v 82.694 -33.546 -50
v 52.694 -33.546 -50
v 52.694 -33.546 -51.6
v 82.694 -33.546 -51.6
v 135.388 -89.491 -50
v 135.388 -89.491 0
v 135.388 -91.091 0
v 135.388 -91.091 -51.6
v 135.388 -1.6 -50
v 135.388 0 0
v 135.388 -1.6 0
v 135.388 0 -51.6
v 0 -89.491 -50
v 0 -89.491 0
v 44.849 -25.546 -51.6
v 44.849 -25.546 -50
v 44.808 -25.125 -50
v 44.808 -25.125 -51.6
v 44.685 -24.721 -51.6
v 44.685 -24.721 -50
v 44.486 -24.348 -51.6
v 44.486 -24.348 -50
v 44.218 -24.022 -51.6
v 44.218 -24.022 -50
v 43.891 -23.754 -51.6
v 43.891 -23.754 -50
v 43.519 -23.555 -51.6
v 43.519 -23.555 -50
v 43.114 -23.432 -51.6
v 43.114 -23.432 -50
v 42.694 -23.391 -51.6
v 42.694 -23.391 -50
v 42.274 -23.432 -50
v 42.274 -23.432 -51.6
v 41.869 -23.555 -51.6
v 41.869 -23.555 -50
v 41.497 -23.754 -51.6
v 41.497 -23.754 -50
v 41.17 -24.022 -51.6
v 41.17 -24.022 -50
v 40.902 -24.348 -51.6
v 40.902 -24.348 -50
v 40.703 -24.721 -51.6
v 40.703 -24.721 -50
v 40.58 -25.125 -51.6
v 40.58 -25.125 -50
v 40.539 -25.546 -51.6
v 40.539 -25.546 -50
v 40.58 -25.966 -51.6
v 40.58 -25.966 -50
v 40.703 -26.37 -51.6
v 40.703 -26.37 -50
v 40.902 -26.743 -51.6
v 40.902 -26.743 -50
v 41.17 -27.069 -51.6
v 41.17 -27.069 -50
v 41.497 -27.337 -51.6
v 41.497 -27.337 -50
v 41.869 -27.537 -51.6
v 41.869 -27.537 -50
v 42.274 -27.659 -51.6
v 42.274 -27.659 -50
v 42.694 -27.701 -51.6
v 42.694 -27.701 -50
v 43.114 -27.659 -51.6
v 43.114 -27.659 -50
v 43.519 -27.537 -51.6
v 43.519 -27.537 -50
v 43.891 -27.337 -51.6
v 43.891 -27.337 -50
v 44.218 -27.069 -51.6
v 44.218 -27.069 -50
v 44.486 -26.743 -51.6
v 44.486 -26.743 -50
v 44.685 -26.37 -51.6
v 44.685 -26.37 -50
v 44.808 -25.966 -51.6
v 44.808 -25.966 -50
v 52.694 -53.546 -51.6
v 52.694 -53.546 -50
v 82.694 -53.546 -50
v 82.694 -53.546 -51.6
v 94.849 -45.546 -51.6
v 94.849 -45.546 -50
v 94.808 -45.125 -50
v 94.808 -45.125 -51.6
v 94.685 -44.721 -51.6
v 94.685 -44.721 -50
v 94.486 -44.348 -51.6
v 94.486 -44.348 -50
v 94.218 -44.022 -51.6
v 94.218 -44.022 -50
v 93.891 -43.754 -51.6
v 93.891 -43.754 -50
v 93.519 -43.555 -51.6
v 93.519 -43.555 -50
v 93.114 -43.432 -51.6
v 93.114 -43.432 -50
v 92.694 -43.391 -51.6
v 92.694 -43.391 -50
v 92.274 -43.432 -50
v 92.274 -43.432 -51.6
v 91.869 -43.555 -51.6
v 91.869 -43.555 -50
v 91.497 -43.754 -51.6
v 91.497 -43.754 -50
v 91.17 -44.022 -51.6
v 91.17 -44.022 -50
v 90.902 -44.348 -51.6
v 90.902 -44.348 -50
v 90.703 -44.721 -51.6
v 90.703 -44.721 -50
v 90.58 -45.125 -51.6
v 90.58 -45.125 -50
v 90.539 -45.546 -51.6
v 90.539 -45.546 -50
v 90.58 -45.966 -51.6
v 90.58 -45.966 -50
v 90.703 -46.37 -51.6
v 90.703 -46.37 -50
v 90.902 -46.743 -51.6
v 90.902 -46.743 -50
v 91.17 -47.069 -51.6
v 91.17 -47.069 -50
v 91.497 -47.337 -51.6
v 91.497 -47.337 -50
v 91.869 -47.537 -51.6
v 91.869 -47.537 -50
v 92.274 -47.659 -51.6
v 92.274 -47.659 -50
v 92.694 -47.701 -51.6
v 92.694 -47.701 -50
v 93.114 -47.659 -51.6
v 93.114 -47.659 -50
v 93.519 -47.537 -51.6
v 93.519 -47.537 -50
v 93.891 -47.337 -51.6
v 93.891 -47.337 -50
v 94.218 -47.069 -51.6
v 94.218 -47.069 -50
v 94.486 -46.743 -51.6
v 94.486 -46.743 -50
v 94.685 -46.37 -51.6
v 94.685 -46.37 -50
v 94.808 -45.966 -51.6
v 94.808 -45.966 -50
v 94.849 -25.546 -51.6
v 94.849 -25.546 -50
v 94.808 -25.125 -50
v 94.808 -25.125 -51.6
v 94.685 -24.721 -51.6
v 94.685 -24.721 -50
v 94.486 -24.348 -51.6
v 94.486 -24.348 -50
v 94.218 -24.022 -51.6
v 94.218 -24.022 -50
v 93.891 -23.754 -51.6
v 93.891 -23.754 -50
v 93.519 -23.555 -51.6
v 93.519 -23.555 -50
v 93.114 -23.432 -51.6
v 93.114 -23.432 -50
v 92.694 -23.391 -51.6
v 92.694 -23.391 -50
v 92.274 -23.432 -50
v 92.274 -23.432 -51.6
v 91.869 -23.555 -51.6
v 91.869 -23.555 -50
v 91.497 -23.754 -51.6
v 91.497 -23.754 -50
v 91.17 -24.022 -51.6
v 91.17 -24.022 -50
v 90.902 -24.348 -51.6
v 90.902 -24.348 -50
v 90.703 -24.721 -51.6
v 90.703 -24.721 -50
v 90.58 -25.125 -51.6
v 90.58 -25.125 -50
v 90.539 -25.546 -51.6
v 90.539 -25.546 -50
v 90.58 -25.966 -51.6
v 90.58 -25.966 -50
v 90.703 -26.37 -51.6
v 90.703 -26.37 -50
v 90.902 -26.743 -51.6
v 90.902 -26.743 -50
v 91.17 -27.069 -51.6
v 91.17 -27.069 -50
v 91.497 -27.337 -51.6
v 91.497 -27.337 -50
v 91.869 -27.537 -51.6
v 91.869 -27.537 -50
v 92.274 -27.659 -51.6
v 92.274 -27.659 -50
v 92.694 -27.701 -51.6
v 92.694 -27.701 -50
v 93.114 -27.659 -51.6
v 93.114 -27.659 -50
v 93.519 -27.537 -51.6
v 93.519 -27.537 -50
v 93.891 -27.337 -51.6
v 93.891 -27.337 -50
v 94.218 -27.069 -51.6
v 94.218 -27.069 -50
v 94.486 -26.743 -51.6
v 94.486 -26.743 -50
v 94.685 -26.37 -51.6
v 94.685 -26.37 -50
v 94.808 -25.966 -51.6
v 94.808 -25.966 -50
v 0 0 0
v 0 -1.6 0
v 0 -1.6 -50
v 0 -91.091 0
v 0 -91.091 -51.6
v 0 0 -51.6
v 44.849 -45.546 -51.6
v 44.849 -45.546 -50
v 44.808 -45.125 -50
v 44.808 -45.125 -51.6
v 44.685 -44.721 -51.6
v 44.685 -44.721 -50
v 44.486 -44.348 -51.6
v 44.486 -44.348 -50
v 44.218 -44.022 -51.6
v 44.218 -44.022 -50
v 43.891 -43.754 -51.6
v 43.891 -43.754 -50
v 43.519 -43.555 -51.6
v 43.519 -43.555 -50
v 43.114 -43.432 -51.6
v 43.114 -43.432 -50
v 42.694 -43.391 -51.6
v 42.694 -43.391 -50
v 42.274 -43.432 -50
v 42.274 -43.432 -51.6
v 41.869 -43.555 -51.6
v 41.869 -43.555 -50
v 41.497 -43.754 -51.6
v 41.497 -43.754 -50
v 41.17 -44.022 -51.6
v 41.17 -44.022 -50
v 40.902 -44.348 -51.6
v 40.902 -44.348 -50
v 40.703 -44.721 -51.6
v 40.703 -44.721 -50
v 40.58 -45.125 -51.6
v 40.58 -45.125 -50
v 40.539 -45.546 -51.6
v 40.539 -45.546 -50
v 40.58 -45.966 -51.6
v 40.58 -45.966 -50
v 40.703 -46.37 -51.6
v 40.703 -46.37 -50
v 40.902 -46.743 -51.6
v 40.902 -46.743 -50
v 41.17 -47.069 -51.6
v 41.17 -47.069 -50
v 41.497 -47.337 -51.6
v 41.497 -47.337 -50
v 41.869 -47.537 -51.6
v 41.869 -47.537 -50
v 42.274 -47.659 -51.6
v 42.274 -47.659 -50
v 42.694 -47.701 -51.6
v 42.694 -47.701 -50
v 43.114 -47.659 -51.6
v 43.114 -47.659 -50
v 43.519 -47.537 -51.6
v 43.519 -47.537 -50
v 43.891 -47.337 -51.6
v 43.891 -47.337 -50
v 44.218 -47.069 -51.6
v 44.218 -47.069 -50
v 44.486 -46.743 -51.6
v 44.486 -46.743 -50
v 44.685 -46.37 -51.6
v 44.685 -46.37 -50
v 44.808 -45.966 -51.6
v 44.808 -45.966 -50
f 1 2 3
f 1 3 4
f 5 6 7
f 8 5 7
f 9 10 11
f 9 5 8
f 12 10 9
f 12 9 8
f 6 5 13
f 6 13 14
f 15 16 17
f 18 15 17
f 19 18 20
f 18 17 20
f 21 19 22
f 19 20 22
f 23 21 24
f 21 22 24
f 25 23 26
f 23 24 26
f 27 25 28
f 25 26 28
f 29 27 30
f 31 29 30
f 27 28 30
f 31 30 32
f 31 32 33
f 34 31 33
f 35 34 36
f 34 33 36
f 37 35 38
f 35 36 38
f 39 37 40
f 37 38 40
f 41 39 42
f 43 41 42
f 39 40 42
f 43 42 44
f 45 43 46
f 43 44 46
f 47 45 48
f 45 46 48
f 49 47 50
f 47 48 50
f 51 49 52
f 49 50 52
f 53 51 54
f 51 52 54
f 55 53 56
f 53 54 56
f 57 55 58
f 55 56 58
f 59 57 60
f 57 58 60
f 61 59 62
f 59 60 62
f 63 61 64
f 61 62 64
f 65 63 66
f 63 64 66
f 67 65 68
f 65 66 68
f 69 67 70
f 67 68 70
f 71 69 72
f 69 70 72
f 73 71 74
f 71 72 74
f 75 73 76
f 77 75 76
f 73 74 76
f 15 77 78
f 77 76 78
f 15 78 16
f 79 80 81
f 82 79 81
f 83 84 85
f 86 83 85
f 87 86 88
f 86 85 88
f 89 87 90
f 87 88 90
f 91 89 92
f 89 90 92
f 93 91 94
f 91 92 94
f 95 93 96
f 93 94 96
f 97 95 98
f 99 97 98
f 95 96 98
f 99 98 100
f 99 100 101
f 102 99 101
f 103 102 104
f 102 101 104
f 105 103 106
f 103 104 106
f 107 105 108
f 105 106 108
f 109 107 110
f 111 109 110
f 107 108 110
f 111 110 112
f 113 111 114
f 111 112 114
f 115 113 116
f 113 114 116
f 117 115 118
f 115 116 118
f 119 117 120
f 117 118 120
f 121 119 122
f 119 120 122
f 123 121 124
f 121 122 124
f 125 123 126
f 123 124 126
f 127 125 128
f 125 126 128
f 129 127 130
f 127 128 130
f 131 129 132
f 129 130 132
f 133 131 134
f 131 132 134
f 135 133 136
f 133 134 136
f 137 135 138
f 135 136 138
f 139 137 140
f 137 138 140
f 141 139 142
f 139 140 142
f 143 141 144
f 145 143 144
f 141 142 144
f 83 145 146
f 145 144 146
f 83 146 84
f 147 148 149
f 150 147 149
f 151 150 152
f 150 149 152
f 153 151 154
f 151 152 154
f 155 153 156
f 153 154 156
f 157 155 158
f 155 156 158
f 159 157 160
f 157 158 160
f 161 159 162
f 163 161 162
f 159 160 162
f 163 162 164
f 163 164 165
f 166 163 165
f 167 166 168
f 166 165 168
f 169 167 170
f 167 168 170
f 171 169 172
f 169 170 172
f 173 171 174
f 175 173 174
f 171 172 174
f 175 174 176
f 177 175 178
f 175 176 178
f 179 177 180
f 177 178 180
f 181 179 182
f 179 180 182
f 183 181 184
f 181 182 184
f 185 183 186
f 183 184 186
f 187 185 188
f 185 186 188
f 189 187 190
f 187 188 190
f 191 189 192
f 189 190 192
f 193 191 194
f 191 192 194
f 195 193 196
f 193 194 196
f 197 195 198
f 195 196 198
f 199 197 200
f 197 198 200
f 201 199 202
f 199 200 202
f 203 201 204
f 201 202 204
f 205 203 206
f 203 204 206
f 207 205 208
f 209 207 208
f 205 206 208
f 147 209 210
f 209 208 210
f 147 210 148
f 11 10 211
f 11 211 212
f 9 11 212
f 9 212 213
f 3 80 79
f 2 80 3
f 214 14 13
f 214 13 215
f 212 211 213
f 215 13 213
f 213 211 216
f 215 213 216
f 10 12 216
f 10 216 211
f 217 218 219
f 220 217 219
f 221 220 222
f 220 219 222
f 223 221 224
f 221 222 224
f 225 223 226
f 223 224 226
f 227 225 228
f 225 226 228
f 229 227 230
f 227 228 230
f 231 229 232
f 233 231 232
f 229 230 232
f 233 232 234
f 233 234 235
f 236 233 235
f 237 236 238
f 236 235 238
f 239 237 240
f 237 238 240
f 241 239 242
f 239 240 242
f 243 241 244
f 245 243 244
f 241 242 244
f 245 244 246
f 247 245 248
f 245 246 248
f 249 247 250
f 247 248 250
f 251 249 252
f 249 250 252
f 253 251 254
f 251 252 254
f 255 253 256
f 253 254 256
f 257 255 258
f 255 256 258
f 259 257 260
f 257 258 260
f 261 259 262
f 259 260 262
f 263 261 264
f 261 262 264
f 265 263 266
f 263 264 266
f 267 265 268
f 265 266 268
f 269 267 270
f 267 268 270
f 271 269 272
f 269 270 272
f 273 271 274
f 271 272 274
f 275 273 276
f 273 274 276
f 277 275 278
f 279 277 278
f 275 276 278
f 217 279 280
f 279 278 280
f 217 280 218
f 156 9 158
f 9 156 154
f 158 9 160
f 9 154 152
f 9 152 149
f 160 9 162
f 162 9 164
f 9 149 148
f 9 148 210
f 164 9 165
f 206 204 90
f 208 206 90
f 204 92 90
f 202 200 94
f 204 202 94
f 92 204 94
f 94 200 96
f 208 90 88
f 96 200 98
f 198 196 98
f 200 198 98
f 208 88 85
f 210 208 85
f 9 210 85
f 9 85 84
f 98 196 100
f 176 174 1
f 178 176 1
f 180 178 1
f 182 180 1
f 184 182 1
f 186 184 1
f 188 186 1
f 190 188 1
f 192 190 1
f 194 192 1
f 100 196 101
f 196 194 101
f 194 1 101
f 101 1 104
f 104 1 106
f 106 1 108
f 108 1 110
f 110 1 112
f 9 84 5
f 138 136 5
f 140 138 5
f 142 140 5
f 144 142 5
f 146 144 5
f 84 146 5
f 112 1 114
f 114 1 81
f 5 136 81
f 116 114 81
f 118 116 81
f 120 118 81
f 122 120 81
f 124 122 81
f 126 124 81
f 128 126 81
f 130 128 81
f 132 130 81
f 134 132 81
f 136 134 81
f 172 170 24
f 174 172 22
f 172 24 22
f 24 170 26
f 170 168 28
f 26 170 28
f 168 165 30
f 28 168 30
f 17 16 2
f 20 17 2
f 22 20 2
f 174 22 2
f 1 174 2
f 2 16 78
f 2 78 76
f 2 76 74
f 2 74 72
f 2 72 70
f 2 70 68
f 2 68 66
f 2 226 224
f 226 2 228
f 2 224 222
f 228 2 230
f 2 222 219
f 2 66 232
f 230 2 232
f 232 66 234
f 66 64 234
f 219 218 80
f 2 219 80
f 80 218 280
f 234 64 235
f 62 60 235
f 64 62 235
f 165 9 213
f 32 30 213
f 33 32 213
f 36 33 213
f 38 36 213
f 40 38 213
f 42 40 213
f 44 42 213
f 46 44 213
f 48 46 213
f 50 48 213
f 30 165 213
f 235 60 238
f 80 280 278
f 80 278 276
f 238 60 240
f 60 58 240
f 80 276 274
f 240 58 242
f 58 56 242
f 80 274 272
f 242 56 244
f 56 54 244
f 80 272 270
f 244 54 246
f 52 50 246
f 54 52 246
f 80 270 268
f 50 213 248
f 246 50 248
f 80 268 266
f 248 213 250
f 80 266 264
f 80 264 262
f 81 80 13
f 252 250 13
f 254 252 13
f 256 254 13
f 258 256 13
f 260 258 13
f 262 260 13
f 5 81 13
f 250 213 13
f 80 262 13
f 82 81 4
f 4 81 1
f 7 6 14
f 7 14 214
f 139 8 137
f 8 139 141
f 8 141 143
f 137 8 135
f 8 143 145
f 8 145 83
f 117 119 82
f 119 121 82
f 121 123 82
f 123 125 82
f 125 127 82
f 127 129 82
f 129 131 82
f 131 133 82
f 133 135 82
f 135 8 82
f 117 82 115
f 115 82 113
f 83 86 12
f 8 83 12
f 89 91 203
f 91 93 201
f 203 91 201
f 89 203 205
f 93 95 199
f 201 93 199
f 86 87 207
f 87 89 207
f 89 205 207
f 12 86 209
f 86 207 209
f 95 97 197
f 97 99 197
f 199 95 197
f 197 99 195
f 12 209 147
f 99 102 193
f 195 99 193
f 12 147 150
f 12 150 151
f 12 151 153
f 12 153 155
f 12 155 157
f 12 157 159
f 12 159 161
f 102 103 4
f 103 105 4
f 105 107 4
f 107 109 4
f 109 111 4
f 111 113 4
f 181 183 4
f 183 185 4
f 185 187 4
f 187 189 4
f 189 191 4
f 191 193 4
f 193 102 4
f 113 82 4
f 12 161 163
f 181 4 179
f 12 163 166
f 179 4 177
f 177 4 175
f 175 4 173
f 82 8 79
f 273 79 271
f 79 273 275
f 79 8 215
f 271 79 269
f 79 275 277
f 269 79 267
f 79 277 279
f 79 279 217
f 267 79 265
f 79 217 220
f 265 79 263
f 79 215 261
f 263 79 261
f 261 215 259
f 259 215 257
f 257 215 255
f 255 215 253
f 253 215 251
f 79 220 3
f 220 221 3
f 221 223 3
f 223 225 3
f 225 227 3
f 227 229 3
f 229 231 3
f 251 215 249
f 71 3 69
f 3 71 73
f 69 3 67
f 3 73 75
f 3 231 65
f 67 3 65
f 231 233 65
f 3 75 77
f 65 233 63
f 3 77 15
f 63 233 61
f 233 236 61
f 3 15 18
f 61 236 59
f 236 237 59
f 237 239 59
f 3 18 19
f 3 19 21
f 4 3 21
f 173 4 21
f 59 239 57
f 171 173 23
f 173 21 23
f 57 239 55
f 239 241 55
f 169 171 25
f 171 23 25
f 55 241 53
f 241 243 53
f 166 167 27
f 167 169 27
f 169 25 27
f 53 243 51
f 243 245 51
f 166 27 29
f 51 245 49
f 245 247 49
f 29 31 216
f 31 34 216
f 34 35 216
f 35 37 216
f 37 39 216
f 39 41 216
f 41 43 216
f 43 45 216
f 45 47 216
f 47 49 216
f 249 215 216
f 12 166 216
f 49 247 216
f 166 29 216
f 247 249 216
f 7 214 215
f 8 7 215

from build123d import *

# Parameters (mm, degrees)
BOSS_EXTRUDE1_DEPTH = 135.3879
SKETCH2_R           = 2.155
SKETCH2_W           = 30
SKETCH2_H           = 20
CUT_EXTRUDE1_DEPTH  = 1.6002


with BuildPart() as part:
    # Sketch1 → Boss-Extrude1 (new body)
    with BuildSketch(Plane(origin=(0, 0, 0), x_dir=(0, 0, -1), z_dir=(1, 0, 0))):
        Polygon((0, 0), (0, -1.6002), (50, -1.6002), (50, -89.49088), (0, -89.49088), (0, -91.09108), (51.6002, -91.09108), (51.6002, 0), align=None)
    extrude(amount=BOSS_EXTRUDE1_DEPTH)

    # Sketch2 → Cut-Extrude1 (cut)
    with BuildSketch(Plane.XY.offset(-50)):
        with Locations((42.69395, -25.54554)):
            Circle(SKETCH2_R)
        with Locations((92.69395, -25.54554)):
            Circle(SKETCH2_R)
        with Locations((42.69395, -45.54554)):
            Circle(SKETCH2_R)
        with Locations((92.69395, -45.54554)):
            Circle(SKETCH2_R)
        with Locations((67.69395, -43.54554)):
            Rectangle(SKETCH2_W, SKETCH2_H)
    extrude(amount=-CUT_EXTRUDE1_DEPTH, mode=Mode.SUBTRACT)


solid = part.part
